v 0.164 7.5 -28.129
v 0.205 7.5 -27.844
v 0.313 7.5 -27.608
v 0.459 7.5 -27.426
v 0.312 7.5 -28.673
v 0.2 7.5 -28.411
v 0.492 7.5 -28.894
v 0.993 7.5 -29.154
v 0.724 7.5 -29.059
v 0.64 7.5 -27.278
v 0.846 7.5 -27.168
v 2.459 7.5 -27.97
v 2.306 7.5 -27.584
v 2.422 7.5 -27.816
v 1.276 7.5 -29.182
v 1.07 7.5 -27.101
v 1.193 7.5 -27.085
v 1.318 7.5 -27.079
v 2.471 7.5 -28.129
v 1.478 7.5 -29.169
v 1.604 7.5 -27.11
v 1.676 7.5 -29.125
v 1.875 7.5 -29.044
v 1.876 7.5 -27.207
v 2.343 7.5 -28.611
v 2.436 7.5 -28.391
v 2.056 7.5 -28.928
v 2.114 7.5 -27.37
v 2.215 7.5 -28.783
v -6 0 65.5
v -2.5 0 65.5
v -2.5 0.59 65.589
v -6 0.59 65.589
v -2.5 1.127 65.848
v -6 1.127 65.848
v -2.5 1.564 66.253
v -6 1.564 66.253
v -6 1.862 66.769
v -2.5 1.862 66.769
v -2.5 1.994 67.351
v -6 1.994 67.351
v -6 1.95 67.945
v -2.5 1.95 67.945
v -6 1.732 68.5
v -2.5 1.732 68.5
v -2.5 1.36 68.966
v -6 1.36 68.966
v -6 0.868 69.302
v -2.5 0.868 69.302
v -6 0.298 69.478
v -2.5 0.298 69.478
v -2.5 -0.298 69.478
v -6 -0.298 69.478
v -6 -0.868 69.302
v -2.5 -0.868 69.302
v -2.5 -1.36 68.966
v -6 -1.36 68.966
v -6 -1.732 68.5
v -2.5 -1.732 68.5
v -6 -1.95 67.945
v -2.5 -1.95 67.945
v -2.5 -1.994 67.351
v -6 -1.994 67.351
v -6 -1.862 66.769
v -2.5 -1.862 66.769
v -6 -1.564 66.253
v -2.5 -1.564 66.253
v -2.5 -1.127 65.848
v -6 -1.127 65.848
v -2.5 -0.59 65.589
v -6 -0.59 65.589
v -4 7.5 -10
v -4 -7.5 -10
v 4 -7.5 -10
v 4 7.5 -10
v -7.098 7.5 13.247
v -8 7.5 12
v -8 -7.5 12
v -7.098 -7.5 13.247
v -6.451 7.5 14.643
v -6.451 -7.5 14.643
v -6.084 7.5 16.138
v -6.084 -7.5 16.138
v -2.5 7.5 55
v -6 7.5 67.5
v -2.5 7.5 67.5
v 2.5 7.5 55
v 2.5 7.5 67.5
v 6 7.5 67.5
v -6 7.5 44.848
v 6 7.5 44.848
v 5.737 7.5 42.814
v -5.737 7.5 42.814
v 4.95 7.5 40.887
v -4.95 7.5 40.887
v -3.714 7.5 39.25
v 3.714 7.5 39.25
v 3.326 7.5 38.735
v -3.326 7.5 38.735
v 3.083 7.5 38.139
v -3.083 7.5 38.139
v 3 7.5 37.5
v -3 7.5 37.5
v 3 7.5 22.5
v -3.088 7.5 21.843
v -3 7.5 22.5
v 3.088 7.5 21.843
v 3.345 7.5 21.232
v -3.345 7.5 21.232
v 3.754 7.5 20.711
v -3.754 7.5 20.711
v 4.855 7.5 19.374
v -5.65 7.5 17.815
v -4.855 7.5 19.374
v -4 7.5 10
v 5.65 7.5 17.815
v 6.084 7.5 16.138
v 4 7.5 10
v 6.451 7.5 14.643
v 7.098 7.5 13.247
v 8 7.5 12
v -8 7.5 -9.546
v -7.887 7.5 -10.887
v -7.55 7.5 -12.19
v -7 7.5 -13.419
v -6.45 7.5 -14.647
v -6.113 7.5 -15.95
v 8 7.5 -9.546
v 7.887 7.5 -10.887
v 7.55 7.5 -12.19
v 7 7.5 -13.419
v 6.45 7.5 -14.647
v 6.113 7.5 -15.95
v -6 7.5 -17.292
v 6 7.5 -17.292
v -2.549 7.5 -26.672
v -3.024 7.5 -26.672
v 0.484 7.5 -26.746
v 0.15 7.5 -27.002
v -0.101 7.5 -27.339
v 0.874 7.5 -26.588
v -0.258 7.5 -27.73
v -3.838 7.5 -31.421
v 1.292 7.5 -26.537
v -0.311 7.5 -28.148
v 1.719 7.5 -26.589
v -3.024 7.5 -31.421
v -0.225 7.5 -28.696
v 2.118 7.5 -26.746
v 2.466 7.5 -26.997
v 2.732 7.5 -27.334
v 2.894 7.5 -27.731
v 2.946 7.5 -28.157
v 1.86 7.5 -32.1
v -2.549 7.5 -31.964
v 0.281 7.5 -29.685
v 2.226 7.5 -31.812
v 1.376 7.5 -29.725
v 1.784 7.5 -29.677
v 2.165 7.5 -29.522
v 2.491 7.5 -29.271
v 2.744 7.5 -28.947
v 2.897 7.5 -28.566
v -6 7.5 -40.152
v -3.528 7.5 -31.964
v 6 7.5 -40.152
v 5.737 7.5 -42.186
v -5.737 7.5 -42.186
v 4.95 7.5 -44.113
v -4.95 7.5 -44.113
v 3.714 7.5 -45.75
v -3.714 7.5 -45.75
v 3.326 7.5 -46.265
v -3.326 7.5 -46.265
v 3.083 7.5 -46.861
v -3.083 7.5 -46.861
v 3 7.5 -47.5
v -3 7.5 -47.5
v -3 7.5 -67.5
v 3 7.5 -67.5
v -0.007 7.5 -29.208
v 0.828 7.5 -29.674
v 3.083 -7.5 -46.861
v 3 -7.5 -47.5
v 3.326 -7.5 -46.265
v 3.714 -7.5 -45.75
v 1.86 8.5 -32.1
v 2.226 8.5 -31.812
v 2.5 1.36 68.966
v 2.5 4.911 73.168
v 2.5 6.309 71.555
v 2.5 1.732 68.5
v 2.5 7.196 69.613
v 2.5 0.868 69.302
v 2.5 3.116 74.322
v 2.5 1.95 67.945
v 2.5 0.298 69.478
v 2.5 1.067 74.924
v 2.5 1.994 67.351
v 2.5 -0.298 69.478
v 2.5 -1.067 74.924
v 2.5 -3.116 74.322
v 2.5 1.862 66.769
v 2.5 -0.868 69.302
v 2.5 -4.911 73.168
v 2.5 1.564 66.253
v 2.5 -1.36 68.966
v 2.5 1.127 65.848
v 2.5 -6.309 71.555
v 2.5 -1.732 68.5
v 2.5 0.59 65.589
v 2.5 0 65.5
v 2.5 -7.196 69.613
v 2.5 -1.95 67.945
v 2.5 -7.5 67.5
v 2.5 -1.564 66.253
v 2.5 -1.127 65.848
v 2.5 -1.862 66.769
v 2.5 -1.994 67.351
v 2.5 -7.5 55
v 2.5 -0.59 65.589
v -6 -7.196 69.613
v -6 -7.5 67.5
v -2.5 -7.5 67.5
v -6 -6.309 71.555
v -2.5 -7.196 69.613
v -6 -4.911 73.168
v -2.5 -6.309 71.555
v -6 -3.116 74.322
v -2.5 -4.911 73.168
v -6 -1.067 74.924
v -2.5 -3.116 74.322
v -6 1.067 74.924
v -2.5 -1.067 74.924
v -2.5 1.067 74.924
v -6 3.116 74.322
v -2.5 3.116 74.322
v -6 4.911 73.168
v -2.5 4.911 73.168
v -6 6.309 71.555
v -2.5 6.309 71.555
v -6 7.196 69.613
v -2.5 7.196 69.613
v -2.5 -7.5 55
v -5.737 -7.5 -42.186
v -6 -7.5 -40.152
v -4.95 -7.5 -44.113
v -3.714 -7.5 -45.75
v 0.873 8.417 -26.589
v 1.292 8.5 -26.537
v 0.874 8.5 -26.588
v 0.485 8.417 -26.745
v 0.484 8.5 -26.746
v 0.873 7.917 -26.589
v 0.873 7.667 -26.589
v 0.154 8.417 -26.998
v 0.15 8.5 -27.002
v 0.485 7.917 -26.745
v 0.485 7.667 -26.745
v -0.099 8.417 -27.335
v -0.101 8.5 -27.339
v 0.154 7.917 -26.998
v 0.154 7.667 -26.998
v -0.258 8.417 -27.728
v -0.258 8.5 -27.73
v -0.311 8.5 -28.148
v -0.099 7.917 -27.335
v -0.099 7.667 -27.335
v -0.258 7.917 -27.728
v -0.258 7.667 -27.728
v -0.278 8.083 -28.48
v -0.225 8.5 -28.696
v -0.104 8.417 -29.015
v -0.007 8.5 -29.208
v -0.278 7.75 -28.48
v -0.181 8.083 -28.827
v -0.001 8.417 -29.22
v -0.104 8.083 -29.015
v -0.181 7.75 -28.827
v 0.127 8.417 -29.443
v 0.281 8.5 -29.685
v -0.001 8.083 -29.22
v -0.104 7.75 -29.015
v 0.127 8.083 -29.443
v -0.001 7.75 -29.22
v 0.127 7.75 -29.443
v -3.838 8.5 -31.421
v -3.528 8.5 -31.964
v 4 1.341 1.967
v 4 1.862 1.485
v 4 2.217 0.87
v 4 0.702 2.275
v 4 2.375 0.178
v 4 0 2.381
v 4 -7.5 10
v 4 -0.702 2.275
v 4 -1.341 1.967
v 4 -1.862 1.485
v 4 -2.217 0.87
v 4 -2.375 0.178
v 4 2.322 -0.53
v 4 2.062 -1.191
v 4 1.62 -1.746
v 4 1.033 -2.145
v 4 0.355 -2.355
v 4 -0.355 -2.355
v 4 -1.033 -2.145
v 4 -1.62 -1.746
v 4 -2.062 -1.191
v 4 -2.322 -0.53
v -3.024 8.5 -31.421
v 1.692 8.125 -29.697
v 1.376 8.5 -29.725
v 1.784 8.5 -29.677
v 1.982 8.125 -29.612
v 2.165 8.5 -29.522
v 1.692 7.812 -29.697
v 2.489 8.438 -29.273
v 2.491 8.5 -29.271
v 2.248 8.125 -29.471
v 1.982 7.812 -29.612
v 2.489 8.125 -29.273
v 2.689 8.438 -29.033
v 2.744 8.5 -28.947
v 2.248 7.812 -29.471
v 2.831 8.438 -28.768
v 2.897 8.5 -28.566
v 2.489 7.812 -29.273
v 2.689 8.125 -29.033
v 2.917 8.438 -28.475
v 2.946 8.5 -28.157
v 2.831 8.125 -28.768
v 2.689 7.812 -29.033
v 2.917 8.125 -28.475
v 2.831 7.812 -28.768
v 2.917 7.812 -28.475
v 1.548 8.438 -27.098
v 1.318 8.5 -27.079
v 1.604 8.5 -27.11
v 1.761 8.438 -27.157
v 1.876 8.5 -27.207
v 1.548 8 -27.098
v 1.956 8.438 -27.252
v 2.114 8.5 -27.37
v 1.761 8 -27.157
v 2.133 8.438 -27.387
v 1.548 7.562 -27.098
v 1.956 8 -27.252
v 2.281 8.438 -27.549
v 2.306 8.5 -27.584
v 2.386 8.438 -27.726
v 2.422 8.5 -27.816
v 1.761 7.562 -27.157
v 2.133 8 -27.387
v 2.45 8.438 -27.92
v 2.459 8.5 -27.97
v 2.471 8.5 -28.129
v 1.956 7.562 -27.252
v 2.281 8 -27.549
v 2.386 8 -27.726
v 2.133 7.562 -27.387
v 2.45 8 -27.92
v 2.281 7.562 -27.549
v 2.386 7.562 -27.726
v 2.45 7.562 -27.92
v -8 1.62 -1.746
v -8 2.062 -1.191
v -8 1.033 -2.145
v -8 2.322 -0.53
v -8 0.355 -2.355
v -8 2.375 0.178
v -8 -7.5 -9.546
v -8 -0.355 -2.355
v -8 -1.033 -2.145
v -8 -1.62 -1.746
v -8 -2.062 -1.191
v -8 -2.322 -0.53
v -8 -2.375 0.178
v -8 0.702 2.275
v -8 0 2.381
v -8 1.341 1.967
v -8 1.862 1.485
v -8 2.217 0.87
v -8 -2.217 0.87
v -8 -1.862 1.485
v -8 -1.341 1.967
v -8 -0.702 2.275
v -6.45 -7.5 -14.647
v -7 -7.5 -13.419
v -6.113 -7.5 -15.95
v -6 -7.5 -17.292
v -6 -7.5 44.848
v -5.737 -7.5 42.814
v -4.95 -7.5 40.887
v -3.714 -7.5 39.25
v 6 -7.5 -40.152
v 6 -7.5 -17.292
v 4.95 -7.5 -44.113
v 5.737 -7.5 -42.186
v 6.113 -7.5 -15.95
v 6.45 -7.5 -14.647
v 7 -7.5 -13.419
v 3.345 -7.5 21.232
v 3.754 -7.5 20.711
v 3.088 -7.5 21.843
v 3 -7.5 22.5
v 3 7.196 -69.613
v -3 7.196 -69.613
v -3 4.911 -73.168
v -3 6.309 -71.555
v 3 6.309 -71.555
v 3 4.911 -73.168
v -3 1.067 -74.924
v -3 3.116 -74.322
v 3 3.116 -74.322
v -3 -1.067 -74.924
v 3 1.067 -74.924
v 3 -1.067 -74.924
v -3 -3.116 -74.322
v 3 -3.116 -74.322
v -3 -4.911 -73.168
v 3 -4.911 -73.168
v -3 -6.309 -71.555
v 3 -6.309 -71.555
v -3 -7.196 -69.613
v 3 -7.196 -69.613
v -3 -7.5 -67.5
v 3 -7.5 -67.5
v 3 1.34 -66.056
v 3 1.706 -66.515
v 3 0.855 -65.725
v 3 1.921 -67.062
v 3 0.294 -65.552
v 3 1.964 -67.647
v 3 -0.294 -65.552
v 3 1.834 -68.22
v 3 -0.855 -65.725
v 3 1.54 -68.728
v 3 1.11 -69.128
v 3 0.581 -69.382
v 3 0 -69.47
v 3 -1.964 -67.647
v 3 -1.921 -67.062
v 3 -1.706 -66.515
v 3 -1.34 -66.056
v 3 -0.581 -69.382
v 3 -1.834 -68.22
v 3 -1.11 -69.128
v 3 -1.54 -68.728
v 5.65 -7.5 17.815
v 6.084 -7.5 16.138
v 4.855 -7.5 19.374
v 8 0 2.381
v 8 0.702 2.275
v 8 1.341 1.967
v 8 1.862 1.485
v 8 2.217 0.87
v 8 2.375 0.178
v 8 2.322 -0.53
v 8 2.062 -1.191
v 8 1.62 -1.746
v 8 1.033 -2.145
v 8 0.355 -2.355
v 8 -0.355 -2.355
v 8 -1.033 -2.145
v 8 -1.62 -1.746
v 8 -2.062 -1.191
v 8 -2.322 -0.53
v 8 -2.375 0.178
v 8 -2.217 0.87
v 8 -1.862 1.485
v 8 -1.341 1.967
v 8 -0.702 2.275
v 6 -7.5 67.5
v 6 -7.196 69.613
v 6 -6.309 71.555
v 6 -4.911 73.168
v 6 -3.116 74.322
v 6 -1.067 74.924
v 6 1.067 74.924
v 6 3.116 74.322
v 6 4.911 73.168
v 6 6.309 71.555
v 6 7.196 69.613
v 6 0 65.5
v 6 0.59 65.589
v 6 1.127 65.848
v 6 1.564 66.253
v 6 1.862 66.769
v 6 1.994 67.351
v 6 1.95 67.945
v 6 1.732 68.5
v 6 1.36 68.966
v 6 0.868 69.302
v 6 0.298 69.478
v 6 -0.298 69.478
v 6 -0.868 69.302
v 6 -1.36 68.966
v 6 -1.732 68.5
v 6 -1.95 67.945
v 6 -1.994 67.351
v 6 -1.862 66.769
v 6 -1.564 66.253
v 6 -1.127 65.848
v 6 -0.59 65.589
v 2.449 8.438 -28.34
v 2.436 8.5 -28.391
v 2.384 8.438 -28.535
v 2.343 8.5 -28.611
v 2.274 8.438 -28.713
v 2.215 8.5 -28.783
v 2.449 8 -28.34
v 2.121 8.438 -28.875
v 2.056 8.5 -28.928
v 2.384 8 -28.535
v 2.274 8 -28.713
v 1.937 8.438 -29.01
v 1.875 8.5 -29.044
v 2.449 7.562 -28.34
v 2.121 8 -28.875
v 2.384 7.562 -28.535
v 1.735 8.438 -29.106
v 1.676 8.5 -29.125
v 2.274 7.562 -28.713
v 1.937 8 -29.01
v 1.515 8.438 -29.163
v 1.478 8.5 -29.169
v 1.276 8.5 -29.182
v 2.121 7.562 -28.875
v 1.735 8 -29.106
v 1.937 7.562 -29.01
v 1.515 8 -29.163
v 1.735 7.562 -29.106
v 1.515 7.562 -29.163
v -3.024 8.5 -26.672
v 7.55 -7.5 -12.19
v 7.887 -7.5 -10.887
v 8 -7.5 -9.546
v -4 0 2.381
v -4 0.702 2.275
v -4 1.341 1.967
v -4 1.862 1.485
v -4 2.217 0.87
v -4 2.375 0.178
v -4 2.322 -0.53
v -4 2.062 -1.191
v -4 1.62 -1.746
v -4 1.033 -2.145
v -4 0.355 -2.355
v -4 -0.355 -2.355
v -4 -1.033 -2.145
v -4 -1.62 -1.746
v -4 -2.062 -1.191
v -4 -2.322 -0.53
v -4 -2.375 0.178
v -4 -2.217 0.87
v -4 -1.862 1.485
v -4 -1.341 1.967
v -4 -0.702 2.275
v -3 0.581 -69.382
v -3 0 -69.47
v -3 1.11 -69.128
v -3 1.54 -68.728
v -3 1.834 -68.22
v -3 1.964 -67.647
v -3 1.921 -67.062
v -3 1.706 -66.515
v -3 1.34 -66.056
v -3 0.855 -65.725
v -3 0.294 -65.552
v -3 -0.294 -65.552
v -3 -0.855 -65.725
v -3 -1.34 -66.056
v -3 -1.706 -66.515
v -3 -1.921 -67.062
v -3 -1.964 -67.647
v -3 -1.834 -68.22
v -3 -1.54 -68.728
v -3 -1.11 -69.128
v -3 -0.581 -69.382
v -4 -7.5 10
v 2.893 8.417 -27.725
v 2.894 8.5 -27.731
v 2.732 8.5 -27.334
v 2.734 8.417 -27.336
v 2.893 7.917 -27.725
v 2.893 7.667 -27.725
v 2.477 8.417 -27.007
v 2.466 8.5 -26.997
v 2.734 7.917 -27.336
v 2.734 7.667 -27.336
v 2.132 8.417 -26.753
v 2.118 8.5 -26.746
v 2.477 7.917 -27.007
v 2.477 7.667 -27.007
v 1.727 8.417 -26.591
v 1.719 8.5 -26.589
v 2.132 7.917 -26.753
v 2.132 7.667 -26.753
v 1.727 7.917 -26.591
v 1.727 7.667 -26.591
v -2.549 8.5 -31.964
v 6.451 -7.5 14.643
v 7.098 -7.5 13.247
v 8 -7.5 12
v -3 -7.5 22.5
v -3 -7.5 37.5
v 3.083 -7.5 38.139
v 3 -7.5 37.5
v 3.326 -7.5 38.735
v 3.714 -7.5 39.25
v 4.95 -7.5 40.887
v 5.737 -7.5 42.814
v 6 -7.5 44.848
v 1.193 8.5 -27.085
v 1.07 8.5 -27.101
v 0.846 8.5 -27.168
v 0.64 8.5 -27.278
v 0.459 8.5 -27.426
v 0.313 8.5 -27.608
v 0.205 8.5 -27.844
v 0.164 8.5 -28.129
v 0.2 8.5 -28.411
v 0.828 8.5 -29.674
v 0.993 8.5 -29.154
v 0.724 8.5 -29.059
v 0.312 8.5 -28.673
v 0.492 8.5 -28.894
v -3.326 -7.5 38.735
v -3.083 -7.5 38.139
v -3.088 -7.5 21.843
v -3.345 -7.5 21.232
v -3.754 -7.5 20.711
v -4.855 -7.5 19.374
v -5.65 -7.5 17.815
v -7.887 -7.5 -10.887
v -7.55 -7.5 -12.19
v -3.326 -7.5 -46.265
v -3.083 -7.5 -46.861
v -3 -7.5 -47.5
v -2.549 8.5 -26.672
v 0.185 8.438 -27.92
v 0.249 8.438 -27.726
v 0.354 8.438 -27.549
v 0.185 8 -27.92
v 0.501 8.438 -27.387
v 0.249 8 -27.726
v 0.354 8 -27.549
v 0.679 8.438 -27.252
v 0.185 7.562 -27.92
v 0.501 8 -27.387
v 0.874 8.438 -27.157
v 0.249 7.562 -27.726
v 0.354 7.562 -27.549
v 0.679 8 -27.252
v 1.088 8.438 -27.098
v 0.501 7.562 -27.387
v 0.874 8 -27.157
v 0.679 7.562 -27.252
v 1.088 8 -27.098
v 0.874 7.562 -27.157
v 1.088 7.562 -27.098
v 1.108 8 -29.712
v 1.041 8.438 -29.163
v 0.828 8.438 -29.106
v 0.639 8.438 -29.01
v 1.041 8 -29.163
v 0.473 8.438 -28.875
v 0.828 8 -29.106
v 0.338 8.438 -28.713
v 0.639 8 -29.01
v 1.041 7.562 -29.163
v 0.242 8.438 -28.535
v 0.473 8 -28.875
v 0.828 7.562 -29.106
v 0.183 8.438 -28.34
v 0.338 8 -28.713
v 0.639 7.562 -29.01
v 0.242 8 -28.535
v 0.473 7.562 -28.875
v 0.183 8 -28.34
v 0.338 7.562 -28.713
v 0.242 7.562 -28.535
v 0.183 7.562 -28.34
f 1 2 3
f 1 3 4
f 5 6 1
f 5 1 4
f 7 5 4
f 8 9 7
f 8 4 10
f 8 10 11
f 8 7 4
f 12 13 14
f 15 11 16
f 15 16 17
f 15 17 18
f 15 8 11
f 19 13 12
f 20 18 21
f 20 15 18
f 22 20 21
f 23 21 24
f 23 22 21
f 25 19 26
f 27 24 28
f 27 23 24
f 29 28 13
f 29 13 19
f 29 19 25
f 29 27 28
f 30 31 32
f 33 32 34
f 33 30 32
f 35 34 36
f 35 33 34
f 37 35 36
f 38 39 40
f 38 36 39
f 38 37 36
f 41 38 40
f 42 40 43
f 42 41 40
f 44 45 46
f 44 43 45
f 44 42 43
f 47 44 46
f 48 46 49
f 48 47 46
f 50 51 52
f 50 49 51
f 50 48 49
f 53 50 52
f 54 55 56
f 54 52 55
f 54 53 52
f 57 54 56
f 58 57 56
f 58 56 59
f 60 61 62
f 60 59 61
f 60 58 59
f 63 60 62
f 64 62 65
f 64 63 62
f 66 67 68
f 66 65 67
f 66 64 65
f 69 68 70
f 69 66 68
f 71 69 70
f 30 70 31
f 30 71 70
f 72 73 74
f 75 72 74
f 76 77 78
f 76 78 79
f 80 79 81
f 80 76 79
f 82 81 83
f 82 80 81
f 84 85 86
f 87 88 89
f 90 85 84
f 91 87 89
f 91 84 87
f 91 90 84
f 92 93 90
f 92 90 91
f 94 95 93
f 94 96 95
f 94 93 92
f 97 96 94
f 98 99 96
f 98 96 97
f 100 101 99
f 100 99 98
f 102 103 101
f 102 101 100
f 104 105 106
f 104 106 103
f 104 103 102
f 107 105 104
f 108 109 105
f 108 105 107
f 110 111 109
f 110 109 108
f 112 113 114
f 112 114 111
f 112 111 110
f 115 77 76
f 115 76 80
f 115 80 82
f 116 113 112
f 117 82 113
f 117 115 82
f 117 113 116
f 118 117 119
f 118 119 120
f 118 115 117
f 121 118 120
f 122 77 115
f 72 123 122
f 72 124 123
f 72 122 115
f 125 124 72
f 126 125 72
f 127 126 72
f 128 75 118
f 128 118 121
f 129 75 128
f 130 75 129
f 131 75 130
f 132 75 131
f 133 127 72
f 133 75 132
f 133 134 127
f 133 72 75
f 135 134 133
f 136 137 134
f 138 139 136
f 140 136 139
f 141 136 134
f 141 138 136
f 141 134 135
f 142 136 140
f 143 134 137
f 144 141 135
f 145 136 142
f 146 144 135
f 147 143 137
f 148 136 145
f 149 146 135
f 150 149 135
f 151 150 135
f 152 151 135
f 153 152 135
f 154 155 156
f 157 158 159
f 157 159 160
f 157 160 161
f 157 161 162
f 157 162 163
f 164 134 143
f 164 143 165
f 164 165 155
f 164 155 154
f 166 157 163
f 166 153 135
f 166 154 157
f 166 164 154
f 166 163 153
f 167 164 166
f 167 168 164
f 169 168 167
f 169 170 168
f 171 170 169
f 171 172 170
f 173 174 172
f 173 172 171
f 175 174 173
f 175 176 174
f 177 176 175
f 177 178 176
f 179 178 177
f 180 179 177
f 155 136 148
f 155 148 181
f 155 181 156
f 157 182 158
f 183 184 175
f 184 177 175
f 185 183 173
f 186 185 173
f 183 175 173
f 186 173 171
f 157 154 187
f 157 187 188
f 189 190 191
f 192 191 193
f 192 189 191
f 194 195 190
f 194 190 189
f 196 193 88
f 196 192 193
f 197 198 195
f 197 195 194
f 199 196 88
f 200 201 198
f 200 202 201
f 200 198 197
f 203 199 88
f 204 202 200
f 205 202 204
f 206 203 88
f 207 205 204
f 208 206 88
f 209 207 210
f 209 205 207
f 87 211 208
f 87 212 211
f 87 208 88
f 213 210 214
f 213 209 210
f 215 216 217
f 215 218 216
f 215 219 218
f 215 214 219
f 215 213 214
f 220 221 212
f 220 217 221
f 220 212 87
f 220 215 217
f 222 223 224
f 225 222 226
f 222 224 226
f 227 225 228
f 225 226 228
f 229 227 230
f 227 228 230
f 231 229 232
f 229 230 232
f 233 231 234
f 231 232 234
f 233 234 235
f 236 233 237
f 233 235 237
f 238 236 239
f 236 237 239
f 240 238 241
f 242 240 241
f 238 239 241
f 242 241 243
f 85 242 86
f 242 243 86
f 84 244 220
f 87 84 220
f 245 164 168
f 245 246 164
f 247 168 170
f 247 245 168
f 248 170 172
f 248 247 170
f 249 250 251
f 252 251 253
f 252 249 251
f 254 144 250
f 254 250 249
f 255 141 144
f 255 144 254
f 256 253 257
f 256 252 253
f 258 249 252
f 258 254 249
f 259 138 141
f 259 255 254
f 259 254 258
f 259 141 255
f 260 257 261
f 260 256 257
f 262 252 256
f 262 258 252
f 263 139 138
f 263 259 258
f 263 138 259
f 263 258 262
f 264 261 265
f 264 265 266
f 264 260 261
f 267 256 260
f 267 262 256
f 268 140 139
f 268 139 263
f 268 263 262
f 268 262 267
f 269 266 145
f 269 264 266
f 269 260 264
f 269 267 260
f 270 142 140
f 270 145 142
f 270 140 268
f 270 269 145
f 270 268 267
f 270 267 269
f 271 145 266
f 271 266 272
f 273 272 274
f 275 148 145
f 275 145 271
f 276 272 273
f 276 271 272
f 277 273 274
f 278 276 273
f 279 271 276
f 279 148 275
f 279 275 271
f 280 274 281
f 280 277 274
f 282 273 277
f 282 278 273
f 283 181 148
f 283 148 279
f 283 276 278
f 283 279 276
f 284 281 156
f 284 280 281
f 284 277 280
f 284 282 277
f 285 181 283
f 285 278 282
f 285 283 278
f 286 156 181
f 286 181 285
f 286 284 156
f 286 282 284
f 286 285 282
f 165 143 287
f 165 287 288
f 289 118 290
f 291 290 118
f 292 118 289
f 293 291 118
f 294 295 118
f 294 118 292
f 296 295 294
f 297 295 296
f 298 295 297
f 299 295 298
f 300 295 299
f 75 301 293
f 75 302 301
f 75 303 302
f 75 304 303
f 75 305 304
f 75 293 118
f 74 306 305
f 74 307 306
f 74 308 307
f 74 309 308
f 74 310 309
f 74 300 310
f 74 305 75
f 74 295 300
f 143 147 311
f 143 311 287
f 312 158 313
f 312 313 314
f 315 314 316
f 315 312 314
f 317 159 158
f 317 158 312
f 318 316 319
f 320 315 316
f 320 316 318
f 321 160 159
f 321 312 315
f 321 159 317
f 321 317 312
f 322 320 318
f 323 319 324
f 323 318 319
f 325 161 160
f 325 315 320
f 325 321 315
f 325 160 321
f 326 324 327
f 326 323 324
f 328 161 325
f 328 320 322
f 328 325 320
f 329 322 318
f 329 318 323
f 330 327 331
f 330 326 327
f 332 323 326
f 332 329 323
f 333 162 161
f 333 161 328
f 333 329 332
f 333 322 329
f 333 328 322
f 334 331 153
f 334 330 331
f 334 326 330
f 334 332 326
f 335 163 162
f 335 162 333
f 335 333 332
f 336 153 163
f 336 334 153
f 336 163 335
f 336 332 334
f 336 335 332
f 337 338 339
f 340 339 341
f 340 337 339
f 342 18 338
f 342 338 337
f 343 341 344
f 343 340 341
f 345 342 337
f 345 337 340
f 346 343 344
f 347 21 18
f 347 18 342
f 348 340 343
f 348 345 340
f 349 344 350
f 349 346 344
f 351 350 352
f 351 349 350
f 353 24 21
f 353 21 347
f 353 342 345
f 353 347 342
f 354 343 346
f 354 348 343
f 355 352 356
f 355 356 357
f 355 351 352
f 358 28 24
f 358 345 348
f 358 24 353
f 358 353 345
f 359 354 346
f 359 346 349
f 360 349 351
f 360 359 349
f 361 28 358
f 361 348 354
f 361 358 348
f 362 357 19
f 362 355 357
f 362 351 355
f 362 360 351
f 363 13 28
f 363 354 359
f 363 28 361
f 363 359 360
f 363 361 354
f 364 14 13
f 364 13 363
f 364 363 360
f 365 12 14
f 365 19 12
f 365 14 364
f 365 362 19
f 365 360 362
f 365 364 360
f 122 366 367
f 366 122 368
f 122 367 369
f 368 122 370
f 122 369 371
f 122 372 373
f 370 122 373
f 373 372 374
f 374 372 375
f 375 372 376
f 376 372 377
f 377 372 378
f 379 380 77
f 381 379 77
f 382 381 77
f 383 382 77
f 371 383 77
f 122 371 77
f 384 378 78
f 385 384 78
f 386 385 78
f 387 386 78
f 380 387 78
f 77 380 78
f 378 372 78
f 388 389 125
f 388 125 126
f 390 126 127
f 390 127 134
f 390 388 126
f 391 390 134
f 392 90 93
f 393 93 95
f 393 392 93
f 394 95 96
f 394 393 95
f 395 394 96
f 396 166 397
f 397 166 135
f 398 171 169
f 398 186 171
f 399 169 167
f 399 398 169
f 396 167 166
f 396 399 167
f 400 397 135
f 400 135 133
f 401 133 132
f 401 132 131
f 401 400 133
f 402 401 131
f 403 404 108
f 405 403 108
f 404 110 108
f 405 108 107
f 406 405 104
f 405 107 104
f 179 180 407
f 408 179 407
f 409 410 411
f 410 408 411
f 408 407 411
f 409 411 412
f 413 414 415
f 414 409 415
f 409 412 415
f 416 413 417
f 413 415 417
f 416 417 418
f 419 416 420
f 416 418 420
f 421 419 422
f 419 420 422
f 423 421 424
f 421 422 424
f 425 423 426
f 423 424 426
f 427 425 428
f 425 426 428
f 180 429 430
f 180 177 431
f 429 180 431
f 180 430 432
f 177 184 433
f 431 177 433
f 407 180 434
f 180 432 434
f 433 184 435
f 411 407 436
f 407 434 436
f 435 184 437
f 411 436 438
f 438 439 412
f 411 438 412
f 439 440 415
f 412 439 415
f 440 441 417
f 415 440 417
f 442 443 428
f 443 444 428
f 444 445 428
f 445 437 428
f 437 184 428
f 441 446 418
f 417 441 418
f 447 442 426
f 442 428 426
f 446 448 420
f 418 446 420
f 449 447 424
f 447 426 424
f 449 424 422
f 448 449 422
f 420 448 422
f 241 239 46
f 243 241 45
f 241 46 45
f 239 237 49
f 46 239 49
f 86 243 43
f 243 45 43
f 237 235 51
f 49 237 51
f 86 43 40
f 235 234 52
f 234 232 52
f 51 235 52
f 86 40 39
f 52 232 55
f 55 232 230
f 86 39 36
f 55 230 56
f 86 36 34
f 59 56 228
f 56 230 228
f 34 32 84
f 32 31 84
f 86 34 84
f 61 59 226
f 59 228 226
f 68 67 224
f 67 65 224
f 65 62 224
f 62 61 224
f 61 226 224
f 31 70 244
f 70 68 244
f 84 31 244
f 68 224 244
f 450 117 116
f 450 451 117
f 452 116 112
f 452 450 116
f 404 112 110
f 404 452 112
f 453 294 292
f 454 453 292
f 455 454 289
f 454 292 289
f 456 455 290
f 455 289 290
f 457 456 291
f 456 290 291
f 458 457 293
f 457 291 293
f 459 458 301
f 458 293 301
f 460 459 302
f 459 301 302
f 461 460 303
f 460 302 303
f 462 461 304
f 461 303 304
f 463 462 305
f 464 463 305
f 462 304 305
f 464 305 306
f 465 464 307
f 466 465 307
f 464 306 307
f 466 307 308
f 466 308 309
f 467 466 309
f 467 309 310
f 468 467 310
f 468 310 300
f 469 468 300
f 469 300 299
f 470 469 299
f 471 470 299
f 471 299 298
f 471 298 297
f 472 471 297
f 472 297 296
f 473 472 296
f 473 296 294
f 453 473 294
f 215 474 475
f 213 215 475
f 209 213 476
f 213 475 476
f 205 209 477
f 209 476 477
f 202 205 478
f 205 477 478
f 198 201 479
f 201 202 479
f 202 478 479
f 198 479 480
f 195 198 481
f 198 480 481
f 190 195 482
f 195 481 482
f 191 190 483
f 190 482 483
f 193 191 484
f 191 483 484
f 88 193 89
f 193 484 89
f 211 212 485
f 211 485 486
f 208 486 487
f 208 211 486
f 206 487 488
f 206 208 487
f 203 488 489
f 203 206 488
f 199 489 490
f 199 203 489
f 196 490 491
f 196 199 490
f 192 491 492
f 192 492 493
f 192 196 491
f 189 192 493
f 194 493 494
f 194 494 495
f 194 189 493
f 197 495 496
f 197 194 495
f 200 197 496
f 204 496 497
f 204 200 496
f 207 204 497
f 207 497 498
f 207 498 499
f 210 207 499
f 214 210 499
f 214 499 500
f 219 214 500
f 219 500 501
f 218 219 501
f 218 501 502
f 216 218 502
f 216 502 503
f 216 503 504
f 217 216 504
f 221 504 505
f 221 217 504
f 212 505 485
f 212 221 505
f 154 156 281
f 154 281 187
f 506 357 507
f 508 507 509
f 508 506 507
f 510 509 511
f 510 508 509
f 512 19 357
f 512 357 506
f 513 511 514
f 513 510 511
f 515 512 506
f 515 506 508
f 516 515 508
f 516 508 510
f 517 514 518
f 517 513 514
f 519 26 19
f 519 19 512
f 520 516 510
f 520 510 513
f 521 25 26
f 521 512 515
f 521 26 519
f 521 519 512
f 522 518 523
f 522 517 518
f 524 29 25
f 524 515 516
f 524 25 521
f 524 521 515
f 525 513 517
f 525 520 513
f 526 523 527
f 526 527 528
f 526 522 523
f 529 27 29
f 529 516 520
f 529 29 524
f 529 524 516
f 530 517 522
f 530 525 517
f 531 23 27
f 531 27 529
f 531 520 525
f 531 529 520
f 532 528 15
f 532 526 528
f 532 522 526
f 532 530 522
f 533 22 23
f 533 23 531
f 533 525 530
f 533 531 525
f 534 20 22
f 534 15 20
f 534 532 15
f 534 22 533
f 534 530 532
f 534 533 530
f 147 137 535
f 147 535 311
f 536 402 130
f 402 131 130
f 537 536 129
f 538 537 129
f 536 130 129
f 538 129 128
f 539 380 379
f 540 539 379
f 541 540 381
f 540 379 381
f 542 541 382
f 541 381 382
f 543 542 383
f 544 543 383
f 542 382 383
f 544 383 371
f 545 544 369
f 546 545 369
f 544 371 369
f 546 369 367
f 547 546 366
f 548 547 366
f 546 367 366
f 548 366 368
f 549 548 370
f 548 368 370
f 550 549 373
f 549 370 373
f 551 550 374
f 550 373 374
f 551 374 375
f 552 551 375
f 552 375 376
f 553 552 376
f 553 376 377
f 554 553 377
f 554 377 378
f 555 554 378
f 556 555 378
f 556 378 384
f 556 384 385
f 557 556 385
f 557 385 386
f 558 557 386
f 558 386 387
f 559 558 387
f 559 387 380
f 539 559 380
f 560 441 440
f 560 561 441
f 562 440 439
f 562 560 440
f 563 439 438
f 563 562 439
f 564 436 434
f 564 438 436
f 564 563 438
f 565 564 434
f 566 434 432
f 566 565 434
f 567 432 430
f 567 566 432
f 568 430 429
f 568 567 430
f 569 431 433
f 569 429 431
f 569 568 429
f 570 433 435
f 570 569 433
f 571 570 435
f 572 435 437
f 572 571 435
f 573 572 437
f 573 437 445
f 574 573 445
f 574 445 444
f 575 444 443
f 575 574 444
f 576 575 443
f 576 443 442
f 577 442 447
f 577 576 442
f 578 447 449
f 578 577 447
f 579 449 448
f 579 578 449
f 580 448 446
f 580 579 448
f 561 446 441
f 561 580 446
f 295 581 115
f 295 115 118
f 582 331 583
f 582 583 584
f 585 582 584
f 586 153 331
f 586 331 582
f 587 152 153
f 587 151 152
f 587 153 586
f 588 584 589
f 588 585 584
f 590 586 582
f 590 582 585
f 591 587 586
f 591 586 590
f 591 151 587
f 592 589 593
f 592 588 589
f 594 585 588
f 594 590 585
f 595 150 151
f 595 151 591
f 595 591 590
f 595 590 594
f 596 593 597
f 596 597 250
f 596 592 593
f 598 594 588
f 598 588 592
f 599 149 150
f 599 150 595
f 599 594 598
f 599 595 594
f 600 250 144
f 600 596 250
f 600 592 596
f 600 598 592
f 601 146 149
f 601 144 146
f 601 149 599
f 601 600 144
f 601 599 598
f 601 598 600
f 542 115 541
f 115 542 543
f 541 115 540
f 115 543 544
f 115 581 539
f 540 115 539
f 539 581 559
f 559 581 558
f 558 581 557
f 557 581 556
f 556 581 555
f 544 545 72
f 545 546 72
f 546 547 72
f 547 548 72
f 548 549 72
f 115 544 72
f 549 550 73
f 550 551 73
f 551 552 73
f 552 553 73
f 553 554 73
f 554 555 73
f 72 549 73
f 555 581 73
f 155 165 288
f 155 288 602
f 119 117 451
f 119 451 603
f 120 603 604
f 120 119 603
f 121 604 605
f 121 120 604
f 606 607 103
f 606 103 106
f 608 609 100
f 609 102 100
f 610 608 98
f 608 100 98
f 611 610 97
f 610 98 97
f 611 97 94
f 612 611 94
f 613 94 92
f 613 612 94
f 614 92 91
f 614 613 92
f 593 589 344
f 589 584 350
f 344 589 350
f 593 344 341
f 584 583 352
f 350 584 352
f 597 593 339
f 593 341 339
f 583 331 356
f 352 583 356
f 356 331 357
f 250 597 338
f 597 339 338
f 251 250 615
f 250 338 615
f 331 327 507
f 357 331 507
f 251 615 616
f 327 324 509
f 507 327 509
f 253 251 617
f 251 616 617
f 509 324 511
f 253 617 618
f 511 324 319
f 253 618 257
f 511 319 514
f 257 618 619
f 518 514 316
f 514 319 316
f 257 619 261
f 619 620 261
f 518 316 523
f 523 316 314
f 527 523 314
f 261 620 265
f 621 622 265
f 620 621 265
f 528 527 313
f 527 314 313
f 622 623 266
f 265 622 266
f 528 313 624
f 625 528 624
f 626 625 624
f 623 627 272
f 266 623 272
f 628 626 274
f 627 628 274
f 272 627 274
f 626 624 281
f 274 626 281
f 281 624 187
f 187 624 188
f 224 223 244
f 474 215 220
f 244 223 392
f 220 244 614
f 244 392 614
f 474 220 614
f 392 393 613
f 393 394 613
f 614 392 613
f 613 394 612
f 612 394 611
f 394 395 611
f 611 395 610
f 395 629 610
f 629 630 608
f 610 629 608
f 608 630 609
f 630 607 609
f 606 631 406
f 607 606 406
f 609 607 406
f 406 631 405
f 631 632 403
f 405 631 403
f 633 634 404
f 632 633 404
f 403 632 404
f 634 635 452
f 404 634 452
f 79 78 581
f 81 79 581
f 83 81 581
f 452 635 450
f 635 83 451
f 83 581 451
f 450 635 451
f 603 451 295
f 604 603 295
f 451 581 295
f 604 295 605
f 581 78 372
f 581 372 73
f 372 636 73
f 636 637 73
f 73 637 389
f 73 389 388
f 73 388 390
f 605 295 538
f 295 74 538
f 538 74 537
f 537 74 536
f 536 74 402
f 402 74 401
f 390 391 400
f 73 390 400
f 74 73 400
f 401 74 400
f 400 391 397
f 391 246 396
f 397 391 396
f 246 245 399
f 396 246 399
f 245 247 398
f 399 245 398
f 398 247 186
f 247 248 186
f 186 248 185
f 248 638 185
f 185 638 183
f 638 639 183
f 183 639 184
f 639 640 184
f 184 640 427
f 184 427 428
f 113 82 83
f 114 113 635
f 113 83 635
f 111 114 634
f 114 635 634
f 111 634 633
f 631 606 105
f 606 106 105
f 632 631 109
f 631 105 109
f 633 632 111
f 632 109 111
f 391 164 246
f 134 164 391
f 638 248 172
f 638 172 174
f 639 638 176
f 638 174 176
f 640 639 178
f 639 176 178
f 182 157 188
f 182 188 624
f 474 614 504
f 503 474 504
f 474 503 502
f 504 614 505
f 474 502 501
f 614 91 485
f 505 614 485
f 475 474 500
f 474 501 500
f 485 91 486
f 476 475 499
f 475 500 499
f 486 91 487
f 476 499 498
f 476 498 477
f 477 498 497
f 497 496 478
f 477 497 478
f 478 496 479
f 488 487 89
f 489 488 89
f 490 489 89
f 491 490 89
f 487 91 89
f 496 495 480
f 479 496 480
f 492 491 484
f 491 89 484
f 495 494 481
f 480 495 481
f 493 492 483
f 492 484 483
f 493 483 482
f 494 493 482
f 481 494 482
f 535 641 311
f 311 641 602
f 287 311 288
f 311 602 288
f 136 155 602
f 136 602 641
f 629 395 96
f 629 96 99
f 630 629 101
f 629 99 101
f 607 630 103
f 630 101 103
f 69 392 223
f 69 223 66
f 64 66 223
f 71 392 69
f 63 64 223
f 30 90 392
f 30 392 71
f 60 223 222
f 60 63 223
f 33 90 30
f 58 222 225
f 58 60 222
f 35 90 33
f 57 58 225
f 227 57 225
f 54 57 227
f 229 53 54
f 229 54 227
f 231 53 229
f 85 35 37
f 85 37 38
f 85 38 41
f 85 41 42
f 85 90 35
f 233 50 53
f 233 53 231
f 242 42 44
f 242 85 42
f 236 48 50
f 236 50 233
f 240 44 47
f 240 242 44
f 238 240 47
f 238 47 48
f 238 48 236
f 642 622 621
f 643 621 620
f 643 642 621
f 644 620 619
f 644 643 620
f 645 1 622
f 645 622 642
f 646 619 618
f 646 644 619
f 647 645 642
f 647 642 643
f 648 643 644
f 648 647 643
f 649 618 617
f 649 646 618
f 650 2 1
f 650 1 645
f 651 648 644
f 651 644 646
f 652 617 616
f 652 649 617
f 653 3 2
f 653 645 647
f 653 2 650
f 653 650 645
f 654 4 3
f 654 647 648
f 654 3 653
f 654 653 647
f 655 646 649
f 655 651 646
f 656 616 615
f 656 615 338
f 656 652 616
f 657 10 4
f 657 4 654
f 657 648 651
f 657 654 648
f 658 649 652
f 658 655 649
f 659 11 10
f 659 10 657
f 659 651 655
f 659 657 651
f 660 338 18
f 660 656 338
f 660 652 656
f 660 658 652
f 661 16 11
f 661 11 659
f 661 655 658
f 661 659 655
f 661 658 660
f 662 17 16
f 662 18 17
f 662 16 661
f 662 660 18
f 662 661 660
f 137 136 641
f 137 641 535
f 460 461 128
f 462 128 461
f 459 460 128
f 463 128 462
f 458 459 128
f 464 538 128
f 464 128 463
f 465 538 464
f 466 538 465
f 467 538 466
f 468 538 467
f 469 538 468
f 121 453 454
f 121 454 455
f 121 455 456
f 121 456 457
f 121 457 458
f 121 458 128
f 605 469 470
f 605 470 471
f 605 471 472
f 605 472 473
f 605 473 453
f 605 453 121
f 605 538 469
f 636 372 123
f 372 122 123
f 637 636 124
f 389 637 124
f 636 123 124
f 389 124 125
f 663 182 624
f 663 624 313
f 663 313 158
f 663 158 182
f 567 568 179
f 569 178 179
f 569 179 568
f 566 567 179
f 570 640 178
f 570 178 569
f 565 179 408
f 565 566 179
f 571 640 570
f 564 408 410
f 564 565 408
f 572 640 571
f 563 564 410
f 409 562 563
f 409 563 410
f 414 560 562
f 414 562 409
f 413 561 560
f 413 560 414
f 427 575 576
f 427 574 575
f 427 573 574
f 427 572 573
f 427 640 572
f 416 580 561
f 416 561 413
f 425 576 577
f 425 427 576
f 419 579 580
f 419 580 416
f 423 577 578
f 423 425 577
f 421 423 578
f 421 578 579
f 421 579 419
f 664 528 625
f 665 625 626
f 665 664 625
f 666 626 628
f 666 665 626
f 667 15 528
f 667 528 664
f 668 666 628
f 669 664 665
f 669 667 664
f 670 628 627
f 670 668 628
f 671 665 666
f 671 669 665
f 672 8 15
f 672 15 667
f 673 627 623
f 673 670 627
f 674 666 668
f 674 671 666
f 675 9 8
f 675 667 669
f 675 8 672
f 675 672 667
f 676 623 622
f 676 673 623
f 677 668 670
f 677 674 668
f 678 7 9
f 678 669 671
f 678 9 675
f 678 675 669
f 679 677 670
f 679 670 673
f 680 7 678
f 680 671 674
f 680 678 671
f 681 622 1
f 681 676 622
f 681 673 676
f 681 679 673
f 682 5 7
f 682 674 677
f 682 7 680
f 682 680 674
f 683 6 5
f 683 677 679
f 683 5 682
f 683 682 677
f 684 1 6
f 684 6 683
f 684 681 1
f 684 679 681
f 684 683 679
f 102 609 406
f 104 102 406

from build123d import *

# Parameters (mm, degrees)
SKETCH1_R           = 2
SKETCH1_R_2         = 2.38125
SKETCH1_R_3         = 1.97
BASE_DEPTH          = 6
ALL_CUTS_DEPTH      = 76.612498967
ALL_CUTS_DEPTH_BACK = 76.612498967
SKETCH2_W           = 5
SKETCH2_H           = 40
SKETCH2_W_2         = 6
SKETCH2_H_2         = 20
SKETCH2_H_3         = 30
SKETCH2_W_3         = 8
SKETCH3_W           = 16
SKETCH3_H           = 24
SKETCH3_W_2         = 8
SKETCH3_H_2         = 20
BOSS_EXTRUDE1_DEPTH = 15
SKETCH4_R           = 2.38125
CUT_EXTRUDE1_DEPTH  = 78.053552806
FILLET1_R           = 2.5
FILLET2_R           = 8
FILLET3_R           = 8
BOSS_EXTRUDE2_DEPTH = 1


with BuildPart() as part:
    # Sketch1 → BASE (new, symmetric)
    with BuildSketch(Plane(origin=(0, 0, 0), x_dir=(0, 0, -1), z_dir=(1, 0, 0))):
        with BuildLine():
            Line((-67.5, 7.5), (67.5, 7.5))
            ThreePointArc((67.5, 7.5), (75, 0), (67.5, -7.5))
            Line((67.5, -7.5), (-67.5, -7.5))
            ThreePointArc((-67.5, -7.5), (-75, 0), (-67.5, 7.5))
        make_face()
        with Locations((-67.5, 0)):
            Circle(SKETCH1_R, mode=Mode.SUBTRACT)
        Circle(SKETCH1_R_2, mode=Mode.SUBTRACT)
        with Locations((67.5, 0)):
            Circle(SKETCH1_R_3, mode=Mode.SUBTRACT)
    extrude(amount=BASE_DEPTH, both=True)

    # Sketch2 → All_Cuts (cut, two sides: drawn at the far end of the back side and taken through both)
    with BuildSketch(Plane(origin=(0, 0, 0), x_dir=(1, 0, 0), z_dir=(0, 1, 0)).offset(-ALL_CUTS_DEPTH_BACK)):
        with Locations((0, -75)):
            Rectangle(SKETCH2_W, SKETCH2_H)
        with Locations((-6, -30)):
            Rectangle(SKETCH2_W_2, SKETCH2_H_2)
        with Locations((6, -30)):
            Rectangle(SKETCH2_W_2, SKETCH2_H_2)
        with Locations((6, 60)):
            Rectangle(SKETCH2_W_2, SKETCH2_H_3)
        with Locations((-6, 60)):
            Rectangle(SKETCH2_W_2, SKETCH2_H_3)
        Rectangle(SKETCH2_W_3, SKETCH2_H_2)
    extrude(amount=ALL_CUTS_DEPTH + ALL_CUTS_DEPTH_BACK, mode=Mode.SUBTRACT)

    # Sketch3 → Boss-Extrude1 (add, through all)
    with BuildSketch(Plane.XZ.offset(7.5)):
        Rectangle(SKETCH3_W, SKETCH3_H)
        Rectangle(SKETCH3_W_2, SKETCH3_H_2, mode=Mode.SUBTRACT)
    extrude(amount=-BOSS_EXTRUDE1_DEPTH)

    # Sketch4 → Cut-Extrude1 (cut, through all)
    with BuildSketch(Plane.ZY.offset(8)):
        Circle(SKETCH4_R)
    extrude(amount=-CUT_EXTRUDE1_DEPTH, mode=Mode.SUBTRACT)

    # Fillet1
    fillet1_edges = [part.edges().sort_by_distance(p)[0] for p in [
        (3, 0, 20),
        (3, 0, 40),
        (-3, 0, 40),
        (-3, 0, 20),
        (3, 0, -45),
        (-3, 0, -45),
    ]]
    fillet(fillet1_edges, radius=FILLET1_R)

    # Fillet2
    # the kernel refuses this fillet: 8 mm, written as the material it adds along each edge
    with BuildSketch(Plane(origin=(-6, -7.5, -12), x_dir=(0, 0, -1), z_dir=(0, 1, 0))) as fillet2_piece_1:
        with BuildLine():
            CenterArc((5.291502622, 8), FILLET2_R, 228.590377891, 41.409622109)
            Line((0, 2), (-0.105830052, 1.88))
            ThreePointArc((-0.105830052, 1.88), (-0.16, 1), (-0.16, 0))
            Line((-0.16, 0), (0, -0.16))
            Line((0, -0.16), (5.291502622, -0.16))
            Line((5.291502622, -0.16), (5.291502622, 0))
        make_face()
    extrude(amount=15)
    with BuildSketch(Plane(origin=(6, -7.5, -12), x_dir=(1, 0, 0), z_dir=(0, 1, 0))) as fillet2_piece_2:
        with BuildLine():
            CenterArc((8, 5.291502622), FILLET2_R, 180, 41.409622109)
            Line((0, 5.291502622), (-0.16, 5.291502622))
            Line((-0.16, 5.291502622), (-0.16, 0))
            Line((-0.16, 0), (0, -0.16))
            ThreePointArc((0, -0.16), (1, -0.16), (1.88, -0.105830052))
            Line((1.88, -0.105830052), (2, 0))
        make_face()
    extrude(amount=15)
    with BuildSketch(Plane(origin=(6, 7.5, 12), x_dir=(0, 0, 1), z_dir=(0, -1, 0))) as fillet2_piece_3:
        with BuildLine():
            CenterArc((5.291502622, -8), FILLET2_R, 90, 41.409622109)
            Line((0, -2), (-0.105830052, -1.88))
            ThreePointArc((-0.105830052, -1.88), (-0.16, -1), (-0.16, 0))
            Line((-0.16, 0), (0, 0.16))
            Line((0, 0.16), (5.291502622, 0.16))
            Line((5.291502622, 0.16), (5.291502622, 0))
        make_face()
    extrude(amount=15)
    with BuildSketch(Plane(origin=(-6, 7.5, 12), x_dir=(-1, 0, 0), z_dir=(0, -1, 0))) as fillet2_piece_4:
        with BuildLine():
            CenterArc((8, -5.291502622), FILLET2_R, 138.590377891, 41.409622109)
            Line((0, -5.291502622), (-0.16, -5.291502622))
            Line((-0.16, -5.291502622), (-0.16, 0))
            Line((-0.16, 0), (0, 0.16))
            ThreePointArc((0, 0.16), (1, 0.16), (1.88, 0.105830052))
            Line((1.88, 0.105830052), (2, 0))
        make_face()
    extrude(amount=15)

    # Fillet3
    fillet3_edges = [part.edges().sort_by_distance(p)[0] for p in [
        (8, 0, -12),
        (-8, 0, -12),
        (-6, 0, 20),
        (6, 0, 20),
        (-6, 0, -45),
        (6, 0, -45),
        (6, 0, 40),
        (-6, 0, 40),
    ]]
    fillet(fillet3_edges, radius=FILLET3_R)

    # Sketch5 → Boss-Extrude2 (add)
    # profile 1 of 2: a face of its own
    with BuildSketch(Plane(origin=(0, 7.5, 0), x_dir=(1, 0, 0), z_dir=(0, 1, 0))):
        Polygon((-3.52782764, 31.96394622), (-2.549420522, 31.96394622), (-2.549420522, 26.672279553), (-3.024313685, 26.672279553), (-3.024313685, 31.421211177), (-3.838416249, 31.421211177), align=None)
    # profile 2 of 2: a face of its own
    with BuildSketch(Plane(origin=(0, 7.5, 0), x_dir=(1, 0, 0), z_dir=(0, 1, 0))):
        with BuildLine():
            Line((1.8603017, 32.09962998), (2.226011836, 31.812362018))
            Line((2.226011836, 31.812362018), (0.827833083, 29.674282758))
            add(Edge.make_bspline(
                [(0.827833083, 29.674282758), (0.920921478, 29.689120381), (1.102500918, 29.718062841), (1.286296979, 29.722837354), (1.375868273, 29.725164168)],
                knots=[0, 0, 0, 0, 1.025318673, 2, 2, 2, 2], degree=3))
            add(Edge.make_bspline(
                [(1.375868273, 29.725164168), (1.4296505, 29.723718619), (1.535519212, 29.720873097), (1.690953306, 29.698974894), (1.840312769, 29.664465498), (1.98297854, 29.614161016), (2.119462691, 29.549901504), (2.250548456, 29.472886784), (2.373771734, 29.3791401), (2.49071935, 29.274418084), (2.596896033, 29.15842931), (2.690900307, 29.035358241), (2.769862242, 28.9053331), (2.833927576, 28.768419743), (2.883676619, 28.624829219), (2.919943654, 28.474745247), (2.941381848, 28.318064331), (2.944293006, 28.211508043), (2.945771785, 28.157380715)],
                knots=[0, 0, 0, 0, 1.04369286, 2.054478336, 3.041073146, 4.015093852, 4.984733326, 5.965804835, 6.960378782, 7.985147595, 9.009457201, 10.008161701, 10.986880575, 11.956520048, 12.937015923, 13.931873656, 14.949455224, 16, 16, 16, 16], degree=3))
            add(Edge.make_bspline(
                [(2.945771785, 28.157380715), (2.943620186, 28.083328067), (2.939386349, 27.937609982), (2.897198467, 27.725373771), (2.831642813, 27.523182944), (2.737938693, 27.334265649), (2.621548661, 27.158880812), (2.479614682, 27.003478977), (2.31717036, 26.864882611), (2.133493892, 26.748985104), (1.935822982, 26.654335253), (1.728159843, 26.586352089), (1.512521181, 26.54449732), (1.366161833, 26.539250099), (1.292125952, 26.536595792)],
                knots=[0, 0, 0, 0, 1.031375318, 2.029502543, 3.004789286, 3.987476834, 4.960371455, 5.9300674, 6.912260825, 7.929083631, 8.949397511, 9.960523116, 10.96833055, 12, 12, 12, 12], degree=3))
            add(Edge.make_bspline(
                [(1.292125952, 26.536595792), (1.220920226, 26.538906294), (1.07987415, 26.543482993), (0.872391235, 26.584252923), (0.673026911, 26.6503339), (0.483177966, 26.741372154), (0.307312278, 26.856364429), (0.149974946, 26.994797875), (0.011950478, 27.153713376), (-0.102915914, 27.333086282), (-0.194021377, 27.525838956), (-0.26234424, 27.726827276), (-0.302252846, 27.935318915), (-0.307829593, 28.076653494), (-0.310638471, 28.14784045)],
                knots=[0, 0, 0, 0, 1.012016664, 2.004627821, 2.994792927, 3.992885782, 4.990978636, 5.973936114, 6.964471063, 7.975201453, 8.993600317, 9.990122807, 10.98767138, 12, 12, 12, 12], degree=3))
            add(Edge.make_bspline(
                [(-0.310638471, 28.14784045), (-0.308852239, 28.202336427), (-0.305205094, 28.3136068), (-0.279739491, 28.482129795), (-0.238820099, 28.654564168), (-0.192993894, 28.800847294), (-0.144574221, 28.920683167), (-0.10427812, 29.017299159), (-0.054122197, 29.116723638), (-0.000641014, 29.222365921), (0.060979491, 29.331503421), (0.127980532, 29.445960159), (0.202214528, 29.563915835), (0.254254536, 29.643962416), (0.280857923, 29.684883052)],
                knots=[0, 0, 0, 0, 1.173818275, 2.396712641, 3.66331629, 4.989737886, 5.693666774, 6.447286557, 7.243889047, 8.091586357, 8.998013824, 9.943181721, 10.948533338, 12, 12, 12, 12], degree=3))
            Line((0.280857923, 29.684883052), (1.8603017, 32.09962998))
        make_face()
        with BuildLine():
            add(Edge.make_bspline(
                [(1.276225511, 29.182429126), (1.235914736, 29.181252798), (1.157176083, 29.178955087), (1.041655349, 29.165612147), (0.9323246, 29.140485703), (0.827735362, 29.108484225), (0.729843001, 29.06448317), (0.637936065, 29.011034617), (0.551659141, 28.948107359), (0.471915914, 28.876592887), (0.399617138, 28.798294313), (0.33735519, 28.714429678), (0.283648704, 28.627020109), (0.239982145, 28.535335268), (0.205979292, 28.439410203), (0.181383246, 28.3396861), (0.167694836, 28.235494232), (0.165417558, 28.164839139), (0.164254691, 28.128759922)],
                knots=[0, 0, 0, 0, 1.129588631, 2.206414736, 3.251139165, 4.268635594, 5.265702196, 6.250456724, 7.242448911, 8.251968645, 9.246821453, 10.222880186, 11.173611482, 12.116736599, 13.062300278, 14.020270554, 14.989073742, 16, 16, 16, 16], degree=3))
            add(Edge.make_bspline(
                [(0.164254691, 28.128759922), (0.16520169, 28.093003404), (0.167058614, 28.022890197), (0.18391986, 27.919567866), (0.209675282, 27.820137588), (0.247987547, 27.725111957), (0.293687723, 27.633042523), (0.354020773, 27.547264175), (0.420872342, 27.462567164), (0.500782455, 27.385457797), (0.586542778, 27.313707901), (0.678166025, 27.250993708), (0.773657869, 27.197341993), (0.874307519, 27.155294262), (0.97868698, 27.120786114), (1.087665913, 27.096502688), (1.201320111, 27.082773797), (1.278309232, 27.080493552), (1.317566657, 27.079330835)],
                knots=[0, 0, 0, 0, 0.989467248, 1.94019797, 2.891935182, 3.827694429, 4.772920941, 5.730924762, 6.725747692, 7.756678648, 8.79901574, 9.819492441, 10.826891316, 11.826466727, 12.835195252, 13.867842842, 14.912794438, 16, 16, 16, 16], degree=3))
            add(Edge.make_bspline(
                [(1.317566657, 27.079330835), (1.356824018, 27.080493643), (1.433813013, 27.082774067), (1.547468125, 27.096501662), (1.656443678, 27.120789879), (1.760835423, 27.155280615), (1.86143973, 27.19739262), (1.956848059, 27.250659927), (2.047604819, 27.314093582), (2.13342144, 27.385335181), (2.212998942, 27.463006041), (2.281453876, 27.546508121), (2.33993924, 27.633735796), (2.387464737, 27.724749273), (2.425355023, 27.820195046), (2.451241051, 27.919552474), (2.468067476, 28.022894227), (2.469929184, 28.093004765), (2.470878623, 28.128759922)],
                knots=[0, 0, 0, 0, 1.087397944, 2.132534446, 3.165364764, 4.174271784, 5.174024072, 6.181601208, 7.194203697, 8.236725232, 9.267838612, 10.269026844, 11.221737037, 12.171628256, 13.107553087, 14.05945871, 15.010357665, 16, 16, 16, 16], degree=3))
            add(Edge.make_bspline(
                [(2.470878623, 28.128759922), (2.470046632, 28.164886207), (2.468413705, 28.235790356), (2.449944355, 28.339639493), (2.424329099, 28.439916888), (2.385649993, 28.535992311), (2.335399503, 28.62748663), (2.274192447, 28.714862026), (2.203386061, 28.798788385), (2.121595733, 28.87674644), (2.032559308, 28.948028332), (1.937890506, 29.010953137), (1.838848689, 29.064058757), (1.735534276, 29.108368304), (1.626763489, 29.140344295), (1.514292381, 29.165522413), (1.396682455, 29.178920939), (1.316889249, 29.181244836), (1.276225511, 29.182429126)],
                knots=[0, 0, 0, 0, 0.978206639, 1.919901502, 2.851605144, 3.780102724, 4.718870031, 5.675451981, 6.667674623, 7.690630536, 8.733308323, 9.756129687, 10.767539656, 11.776269907, 12.797430371, 13.836405707, 14.897401972, 16, 16, 16, 16], degree=3))
        make_face(mode=Mode.SUBTRACT)
    extrude(amount=BOSS_EXTRUDE2_DEPTH)


solid = part.part
